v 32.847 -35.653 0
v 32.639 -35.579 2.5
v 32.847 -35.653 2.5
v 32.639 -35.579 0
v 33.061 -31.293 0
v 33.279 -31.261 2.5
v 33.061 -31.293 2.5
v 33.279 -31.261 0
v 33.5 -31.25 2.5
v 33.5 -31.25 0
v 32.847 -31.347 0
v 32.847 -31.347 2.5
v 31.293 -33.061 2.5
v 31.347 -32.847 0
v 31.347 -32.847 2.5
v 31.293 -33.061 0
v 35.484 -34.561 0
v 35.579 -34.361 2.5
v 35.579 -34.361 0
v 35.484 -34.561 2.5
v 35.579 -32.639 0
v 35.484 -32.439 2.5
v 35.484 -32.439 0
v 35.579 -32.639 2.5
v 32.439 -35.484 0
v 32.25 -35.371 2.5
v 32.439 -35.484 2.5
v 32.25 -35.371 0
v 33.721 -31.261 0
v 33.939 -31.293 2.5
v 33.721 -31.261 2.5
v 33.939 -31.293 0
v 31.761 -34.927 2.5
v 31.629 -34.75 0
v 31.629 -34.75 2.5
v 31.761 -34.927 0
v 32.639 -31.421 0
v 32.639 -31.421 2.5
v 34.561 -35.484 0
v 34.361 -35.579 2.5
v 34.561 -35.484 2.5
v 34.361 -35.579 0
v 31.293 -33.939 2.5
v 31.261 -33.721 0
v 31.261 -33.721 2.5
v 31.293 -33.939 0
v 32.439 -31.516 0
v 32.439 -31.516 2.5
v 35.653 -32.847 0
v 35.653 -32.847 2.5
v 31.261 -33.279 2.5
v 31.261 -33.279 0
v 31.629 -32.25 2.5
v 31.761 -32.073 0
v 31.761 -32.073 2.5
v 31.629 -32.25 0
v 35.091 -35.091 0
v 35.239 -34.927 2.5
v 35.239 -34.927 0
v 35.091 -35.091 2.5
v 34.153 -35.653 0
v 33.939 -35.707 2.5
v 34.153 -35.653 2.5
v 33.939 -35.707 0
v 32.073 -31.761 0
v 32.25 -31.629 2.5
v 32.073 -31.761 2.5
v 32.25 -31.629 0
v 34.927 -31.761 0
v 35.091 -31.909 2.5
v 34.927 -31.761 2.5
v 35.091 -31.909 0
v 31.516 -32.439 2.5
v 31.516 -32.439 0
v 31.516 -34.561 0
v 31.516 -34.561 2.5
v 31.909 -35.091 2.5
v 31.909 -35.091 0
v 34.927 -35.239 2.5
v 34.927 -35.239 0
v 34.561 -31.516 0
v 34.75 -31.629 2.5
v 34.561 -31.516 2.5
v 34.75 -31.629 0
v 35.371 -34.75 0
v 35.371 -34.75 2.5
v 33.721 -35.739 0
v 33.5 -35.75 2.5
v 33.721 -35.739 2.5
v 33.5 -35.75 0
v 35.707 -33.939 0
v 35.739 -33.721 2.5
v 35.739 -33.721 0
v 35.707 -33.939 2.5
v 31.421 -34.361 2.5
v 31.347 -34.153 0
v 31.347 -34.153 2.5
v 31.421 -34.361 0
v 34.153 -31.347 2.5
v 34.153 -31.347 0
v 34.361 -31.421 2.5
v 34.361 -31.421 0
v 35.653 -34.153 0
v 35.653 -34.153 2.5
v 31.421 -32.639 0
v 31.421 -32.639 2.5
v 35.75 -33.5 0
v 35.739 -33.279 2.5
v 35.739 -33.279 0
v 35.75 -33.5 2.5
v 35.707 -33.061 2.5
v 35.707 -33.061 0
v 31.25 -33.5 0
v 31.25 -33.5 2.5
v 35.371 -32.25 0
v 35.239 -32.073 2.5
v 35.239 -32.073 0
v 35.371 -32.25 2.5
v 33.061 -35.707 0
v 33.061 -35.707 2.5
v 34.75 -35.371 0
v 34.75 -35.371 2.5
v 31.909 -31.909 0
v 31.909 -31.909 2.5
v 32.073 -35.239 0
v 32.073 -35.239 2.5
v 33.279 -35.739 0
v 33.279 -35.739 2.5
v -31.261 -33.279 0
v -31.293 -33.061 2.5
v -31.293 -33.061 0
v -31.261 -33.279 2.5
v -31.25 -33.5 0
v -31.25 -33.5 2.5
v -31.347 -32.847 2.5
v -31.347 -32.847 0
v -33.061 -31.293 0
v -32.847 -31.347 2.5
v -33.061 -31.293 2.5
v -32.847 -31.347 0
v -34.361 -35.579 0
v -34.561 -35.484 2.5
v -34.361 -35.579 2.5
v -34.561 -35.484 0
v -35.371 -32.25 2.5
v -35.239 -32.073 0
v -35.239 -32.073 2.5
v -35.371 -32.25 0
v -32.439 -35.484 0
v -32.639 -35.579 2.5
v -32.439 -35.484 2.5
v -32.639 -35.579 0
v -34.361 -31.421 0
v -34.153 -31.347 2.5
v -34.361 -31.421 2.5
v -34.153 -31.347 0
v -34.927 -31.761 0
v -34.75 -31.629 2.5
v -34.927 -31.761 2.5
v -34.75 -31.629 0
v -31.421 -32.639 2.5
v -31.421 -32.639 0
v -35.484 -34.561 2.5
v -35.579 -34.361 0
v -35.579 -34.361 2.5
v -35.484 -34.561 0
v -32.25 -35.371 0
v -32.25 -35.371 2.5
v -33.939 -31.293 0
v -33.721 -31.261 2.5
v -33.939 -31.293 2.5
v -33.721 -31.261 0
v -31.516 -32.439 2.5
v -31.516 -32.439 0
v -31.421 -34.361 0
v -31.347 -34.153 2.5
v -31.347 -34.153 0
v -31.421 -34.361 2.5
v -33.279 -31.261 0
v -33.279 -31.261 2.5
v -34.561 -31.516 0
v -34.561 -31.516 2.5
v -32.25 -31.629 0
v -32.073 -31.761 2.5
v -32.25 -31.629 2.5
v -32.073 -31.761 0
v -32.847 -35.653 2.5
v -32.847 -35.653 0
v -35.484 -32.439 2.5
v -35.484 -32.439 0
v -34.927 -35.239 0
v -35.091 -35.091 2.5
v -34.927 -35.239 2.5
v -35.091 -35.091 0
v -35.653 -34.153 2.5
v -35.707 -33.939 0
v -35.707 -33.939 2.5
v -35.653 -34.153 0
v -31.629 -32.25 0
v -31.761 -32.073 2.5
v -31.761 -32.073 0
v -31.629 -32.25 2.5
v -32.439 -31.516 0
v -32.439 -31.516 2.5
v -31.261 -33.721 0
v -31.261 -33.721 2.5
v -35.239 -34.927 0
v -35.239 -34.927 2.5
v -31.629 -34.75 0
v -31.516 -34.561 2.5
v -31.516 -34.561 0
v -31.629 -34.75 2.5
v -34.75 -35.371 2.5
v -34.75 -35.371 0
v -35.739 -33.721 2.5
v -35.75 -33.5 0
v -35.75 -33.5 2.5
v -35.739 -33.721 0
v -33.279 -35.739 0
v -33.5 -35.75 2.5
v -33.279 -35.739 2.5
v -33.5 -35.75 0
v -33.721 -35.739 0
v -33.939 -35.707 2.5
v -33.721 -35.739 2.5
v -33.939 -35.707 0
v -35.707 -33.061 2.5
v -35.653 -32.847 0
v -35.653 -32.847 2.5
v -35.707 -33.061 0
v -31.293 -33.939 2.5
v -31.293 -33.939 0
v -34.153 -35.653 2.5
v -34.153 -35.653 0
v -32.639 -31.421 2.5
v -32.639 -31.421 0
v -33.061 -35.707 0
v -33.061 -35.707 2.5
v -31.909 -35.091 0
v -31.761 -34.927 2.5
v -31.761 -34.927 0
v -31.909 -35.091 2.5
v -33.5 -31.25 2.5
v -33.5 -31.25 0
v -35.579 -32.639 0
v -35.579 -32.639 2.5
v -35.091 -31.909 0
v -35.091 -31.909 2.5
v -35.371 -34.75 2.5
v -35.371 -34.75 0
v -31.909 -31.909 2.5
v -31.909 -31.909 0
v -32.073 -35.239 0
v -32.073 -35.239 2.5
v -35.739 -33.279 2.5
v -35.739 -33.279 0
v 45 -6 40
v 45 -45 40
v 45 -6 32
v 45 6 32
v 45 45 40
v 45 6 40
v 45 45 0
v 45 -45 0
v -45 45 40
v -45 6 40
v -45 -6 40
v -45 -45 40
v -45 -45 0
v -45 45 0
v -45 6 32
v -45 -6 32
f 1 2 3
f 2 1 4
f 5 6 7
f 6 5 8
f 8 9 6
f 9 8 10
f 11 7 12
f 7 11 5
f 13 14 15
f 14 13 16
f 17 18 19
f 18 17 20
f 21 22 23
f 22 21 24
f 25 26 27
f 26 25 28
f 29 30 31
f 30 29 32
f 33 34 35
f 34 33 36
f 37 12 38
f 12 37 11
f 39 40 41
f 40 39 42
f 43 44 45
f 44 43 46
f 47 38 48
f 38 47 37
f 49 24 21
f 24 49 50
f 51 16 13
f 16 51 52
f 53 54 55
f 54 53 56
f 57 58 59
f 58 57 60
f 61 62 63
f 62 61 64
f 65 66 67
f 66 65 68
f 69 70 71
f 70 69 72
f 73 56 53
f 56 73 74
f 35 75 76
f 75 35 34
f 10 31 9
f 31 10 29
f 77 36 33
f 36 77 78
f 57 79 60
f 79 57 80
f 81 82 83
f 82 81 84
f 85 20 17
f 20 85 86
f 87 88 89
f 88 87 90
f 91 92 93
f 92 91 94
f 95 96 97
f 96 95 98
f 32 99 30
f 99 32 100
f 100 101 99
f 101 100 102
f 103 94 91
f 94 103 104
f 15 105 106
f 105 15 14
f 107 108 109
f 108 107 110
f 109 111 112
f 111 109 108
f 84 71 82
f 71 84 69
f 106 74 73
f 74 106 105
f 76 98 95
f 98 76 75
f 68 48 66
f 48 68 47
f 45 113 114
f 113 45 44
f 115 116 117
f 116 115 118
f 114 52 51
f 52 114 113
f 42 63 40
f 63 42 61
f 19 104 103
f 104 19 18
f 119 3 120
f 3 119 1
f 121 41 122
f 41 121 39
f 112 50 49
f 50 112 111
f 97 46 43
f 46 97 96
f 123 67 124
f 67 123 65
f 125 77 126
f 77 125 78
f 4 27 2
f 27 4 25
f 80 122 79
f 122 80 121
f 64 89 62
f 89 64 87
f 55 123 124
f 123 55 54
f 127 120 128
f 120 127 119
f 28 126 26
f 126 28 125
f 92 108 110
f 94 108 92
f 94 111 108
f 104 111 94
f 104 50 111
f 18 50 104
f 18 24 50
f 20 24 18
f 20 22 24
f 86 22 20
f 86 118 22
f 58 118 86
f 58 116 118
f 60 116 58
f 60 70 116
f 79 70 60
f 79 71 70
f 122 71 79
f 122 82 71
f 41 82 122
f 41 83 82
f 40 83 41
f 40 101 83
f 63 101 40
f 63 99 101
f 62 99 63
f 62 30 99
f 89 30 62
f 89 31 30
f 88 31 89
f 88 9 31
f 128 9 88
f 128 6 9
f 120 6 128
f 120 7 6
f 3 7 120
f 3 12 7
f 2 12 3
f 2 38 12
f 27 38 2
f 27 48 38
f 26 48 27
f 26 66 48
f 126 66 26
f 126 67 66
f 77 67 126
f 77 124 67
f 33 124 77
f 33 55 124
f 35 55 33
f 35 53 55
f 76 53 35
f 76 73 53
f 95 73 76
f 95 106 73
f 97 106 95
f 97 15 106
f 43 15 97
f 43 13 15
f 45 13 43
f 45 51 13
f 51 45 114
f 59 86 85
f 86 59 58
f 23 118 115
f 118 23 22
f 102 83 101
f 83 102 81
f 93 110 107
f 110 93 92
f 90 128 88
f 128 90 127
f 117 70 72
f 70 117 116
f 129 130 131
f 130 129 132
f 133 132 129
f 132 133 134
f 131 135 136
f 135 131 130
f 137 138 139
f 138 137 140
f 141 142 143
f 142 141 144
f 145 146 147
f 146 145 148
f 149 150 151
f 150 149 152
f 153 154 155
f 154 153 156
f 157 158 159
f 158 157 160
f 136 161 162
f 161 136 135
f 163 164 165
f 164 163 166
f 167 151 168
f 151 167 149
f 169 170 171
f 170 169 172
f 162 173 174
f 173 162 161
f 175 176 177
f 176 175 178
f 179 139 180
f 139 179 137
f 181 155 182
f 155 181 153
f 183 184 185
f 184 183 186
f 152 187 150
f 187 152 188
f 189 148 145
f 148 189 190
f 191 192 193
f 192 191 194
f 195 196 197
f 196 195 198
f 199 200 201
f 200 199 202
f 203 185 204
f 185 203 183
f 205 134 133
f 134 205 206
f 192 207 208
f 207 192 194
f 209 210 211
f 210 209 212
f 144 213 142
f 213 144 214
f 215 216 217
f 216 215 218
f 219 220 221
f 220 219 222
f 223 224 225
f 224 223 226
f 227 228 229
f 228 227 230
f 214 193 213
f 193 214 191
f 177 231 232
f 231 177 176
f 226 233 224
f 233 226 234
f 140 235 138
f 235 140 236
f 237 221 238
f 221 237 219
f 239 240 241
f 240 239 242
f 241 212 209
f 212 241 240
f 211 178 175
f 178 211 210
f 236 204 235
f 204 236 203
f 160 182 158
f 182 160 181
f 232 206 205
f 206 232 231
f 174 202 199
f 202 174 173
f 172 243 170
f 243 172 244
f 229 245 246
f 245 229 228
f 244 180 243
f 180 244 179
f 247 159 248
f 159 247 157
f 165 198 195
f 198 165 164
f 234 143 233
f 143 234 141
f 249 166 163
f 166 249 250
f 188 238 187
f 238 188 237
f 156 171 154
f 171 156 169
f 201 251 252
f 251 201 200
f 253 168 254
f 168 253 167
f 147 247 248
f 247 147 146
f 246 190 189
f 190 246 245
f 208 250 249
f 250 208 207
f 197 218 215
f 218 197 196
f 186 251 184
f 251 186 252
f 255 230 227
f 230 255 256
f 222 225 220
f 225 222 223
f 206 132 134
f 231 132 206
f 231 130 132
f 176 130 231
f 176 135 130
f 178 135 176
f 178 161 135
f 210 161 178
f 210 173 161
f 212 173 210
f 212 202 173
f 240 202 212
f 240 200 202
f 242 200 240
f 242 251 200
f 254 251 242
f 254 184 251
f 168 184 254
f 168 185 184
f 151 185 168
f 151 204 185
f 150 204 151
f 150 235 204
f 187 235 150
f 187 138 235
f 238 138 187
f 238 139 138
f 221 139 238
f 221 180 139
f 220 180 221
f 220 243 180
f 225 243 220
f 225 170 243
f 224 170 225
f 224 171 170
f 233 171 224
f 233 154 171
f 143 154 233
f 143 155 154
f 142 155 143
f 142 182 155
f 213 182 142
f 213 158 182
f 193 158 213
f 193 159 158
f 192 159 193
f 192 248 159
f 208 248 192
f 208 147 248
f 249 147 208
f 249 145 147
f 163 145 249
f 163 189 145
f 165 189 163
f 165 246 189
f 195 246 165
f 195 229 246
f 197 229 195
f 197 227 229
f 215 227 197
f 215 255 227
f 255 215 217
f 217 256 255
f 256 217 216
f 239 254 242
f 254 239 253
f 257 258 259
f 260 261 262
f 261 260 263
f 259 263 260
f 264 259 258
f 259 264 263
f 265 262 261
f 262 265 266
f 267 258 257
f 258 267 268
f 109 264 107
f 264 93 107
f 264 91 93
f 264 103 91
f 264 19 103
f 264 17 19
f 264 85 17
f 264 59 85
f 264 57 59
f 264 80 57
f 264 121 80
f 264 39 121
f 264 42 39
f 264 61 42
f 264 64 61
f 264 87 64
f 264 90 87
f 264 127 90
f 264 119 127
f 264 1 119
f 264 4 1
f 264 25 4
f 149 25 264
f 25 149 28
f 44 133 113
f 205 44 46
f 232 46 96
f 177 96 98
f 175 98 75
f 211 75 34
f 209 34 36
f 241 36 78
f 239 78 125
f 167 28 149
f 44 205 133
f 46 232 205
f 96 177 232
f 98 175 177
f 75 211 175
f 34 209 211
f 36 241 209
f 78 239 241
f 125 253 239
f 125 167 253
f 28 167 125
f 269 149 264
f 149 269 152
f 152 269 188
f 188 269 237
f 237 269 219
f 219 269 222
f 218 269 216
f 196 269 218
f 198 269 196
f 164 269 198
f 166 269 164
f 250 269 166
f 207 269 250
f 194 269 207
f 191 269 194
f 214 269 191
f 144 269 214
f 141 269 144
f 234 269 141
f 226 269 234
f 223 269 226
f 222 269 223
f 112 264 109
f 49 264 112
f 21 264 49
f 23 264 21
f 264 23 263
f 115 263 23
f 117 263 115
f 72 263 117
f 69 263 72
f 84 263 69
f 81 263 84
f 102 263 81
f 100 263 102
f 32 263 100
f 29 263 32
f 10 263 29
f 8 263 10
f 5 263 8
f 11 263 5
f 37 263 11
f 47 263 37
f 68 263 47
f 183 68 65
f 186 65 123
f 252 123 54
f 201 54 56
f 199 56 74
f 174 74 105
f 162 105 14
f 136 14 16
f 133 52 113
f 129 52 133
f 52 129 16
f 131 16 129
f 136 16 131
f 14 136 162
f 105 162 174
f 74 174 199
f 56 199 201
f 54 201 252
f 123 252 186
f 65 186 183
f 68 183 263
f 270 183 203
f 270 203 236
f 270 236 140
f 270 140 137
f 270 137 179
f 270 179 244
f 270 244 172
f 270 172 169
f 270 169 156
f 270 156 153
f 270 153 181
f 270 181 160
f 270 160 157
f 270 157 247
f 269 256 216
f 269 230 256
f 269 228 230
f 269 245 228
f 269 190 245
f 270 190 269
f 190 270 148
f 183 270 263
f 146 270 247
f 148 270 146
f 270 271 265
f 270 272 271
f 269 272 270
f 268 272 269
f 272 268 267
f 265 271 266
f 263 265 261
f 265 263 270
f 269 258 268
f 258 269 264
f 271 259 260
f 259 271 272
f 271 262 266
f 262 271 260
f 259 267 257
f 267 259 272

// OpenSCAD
// Magnetic stirrer housing for 80 mm PC case fan
// Print orientation: top plate on bed (z = 0), walls rise to open top at z = 40

// ---------- Parameters ----------
plate_t      = 2;     // top plate thickness
wall_t       = 2.5;   // wall thickness
outer_x      = 90;    // outer size in X
outer_y      = 90;    // outer size in Y
open_z       = 40;    // height of open top
screw_d      = 4.5;   // M4 screw hole diameter
screw_pitch  = 71.5;  // screw hole pattern size (X and Y)
cable_w      = 12;    // cable notch width
cable_h      = 8;     // cable notch depth from open edge
eps          = 0.5;   // cutter overshoot past faces

$fn = 64;

// ---------- Model ----------
difference() {
    // Solid block of the housing
    translate([-outer_x/2, -outer_y/2, 0])
        cube([outer_x, outer_y, open_z]);

    // Cable notch in one wall (z = 32 to 40), centred along the wall
    translate([-outer_x/2, -cable_w/2, open_z - cable_h])
        cube([outer_x + 2*eps, cable_w, cable_h + eps]);

    // Four M4 screw holes through the top plate on a square pattern
    for (i = [0:3]) {
        rotate([0, 0, i < 2 ? 90 : 0])
            translate([-(screw_pitch/2 - screw_d/2),
                       -(screw_pitch/2 - screw_d/2),
                       -eps])
                cylinder(d = screw_d, h = plate_t + 2*eps, $fn = 64);
    }
}
